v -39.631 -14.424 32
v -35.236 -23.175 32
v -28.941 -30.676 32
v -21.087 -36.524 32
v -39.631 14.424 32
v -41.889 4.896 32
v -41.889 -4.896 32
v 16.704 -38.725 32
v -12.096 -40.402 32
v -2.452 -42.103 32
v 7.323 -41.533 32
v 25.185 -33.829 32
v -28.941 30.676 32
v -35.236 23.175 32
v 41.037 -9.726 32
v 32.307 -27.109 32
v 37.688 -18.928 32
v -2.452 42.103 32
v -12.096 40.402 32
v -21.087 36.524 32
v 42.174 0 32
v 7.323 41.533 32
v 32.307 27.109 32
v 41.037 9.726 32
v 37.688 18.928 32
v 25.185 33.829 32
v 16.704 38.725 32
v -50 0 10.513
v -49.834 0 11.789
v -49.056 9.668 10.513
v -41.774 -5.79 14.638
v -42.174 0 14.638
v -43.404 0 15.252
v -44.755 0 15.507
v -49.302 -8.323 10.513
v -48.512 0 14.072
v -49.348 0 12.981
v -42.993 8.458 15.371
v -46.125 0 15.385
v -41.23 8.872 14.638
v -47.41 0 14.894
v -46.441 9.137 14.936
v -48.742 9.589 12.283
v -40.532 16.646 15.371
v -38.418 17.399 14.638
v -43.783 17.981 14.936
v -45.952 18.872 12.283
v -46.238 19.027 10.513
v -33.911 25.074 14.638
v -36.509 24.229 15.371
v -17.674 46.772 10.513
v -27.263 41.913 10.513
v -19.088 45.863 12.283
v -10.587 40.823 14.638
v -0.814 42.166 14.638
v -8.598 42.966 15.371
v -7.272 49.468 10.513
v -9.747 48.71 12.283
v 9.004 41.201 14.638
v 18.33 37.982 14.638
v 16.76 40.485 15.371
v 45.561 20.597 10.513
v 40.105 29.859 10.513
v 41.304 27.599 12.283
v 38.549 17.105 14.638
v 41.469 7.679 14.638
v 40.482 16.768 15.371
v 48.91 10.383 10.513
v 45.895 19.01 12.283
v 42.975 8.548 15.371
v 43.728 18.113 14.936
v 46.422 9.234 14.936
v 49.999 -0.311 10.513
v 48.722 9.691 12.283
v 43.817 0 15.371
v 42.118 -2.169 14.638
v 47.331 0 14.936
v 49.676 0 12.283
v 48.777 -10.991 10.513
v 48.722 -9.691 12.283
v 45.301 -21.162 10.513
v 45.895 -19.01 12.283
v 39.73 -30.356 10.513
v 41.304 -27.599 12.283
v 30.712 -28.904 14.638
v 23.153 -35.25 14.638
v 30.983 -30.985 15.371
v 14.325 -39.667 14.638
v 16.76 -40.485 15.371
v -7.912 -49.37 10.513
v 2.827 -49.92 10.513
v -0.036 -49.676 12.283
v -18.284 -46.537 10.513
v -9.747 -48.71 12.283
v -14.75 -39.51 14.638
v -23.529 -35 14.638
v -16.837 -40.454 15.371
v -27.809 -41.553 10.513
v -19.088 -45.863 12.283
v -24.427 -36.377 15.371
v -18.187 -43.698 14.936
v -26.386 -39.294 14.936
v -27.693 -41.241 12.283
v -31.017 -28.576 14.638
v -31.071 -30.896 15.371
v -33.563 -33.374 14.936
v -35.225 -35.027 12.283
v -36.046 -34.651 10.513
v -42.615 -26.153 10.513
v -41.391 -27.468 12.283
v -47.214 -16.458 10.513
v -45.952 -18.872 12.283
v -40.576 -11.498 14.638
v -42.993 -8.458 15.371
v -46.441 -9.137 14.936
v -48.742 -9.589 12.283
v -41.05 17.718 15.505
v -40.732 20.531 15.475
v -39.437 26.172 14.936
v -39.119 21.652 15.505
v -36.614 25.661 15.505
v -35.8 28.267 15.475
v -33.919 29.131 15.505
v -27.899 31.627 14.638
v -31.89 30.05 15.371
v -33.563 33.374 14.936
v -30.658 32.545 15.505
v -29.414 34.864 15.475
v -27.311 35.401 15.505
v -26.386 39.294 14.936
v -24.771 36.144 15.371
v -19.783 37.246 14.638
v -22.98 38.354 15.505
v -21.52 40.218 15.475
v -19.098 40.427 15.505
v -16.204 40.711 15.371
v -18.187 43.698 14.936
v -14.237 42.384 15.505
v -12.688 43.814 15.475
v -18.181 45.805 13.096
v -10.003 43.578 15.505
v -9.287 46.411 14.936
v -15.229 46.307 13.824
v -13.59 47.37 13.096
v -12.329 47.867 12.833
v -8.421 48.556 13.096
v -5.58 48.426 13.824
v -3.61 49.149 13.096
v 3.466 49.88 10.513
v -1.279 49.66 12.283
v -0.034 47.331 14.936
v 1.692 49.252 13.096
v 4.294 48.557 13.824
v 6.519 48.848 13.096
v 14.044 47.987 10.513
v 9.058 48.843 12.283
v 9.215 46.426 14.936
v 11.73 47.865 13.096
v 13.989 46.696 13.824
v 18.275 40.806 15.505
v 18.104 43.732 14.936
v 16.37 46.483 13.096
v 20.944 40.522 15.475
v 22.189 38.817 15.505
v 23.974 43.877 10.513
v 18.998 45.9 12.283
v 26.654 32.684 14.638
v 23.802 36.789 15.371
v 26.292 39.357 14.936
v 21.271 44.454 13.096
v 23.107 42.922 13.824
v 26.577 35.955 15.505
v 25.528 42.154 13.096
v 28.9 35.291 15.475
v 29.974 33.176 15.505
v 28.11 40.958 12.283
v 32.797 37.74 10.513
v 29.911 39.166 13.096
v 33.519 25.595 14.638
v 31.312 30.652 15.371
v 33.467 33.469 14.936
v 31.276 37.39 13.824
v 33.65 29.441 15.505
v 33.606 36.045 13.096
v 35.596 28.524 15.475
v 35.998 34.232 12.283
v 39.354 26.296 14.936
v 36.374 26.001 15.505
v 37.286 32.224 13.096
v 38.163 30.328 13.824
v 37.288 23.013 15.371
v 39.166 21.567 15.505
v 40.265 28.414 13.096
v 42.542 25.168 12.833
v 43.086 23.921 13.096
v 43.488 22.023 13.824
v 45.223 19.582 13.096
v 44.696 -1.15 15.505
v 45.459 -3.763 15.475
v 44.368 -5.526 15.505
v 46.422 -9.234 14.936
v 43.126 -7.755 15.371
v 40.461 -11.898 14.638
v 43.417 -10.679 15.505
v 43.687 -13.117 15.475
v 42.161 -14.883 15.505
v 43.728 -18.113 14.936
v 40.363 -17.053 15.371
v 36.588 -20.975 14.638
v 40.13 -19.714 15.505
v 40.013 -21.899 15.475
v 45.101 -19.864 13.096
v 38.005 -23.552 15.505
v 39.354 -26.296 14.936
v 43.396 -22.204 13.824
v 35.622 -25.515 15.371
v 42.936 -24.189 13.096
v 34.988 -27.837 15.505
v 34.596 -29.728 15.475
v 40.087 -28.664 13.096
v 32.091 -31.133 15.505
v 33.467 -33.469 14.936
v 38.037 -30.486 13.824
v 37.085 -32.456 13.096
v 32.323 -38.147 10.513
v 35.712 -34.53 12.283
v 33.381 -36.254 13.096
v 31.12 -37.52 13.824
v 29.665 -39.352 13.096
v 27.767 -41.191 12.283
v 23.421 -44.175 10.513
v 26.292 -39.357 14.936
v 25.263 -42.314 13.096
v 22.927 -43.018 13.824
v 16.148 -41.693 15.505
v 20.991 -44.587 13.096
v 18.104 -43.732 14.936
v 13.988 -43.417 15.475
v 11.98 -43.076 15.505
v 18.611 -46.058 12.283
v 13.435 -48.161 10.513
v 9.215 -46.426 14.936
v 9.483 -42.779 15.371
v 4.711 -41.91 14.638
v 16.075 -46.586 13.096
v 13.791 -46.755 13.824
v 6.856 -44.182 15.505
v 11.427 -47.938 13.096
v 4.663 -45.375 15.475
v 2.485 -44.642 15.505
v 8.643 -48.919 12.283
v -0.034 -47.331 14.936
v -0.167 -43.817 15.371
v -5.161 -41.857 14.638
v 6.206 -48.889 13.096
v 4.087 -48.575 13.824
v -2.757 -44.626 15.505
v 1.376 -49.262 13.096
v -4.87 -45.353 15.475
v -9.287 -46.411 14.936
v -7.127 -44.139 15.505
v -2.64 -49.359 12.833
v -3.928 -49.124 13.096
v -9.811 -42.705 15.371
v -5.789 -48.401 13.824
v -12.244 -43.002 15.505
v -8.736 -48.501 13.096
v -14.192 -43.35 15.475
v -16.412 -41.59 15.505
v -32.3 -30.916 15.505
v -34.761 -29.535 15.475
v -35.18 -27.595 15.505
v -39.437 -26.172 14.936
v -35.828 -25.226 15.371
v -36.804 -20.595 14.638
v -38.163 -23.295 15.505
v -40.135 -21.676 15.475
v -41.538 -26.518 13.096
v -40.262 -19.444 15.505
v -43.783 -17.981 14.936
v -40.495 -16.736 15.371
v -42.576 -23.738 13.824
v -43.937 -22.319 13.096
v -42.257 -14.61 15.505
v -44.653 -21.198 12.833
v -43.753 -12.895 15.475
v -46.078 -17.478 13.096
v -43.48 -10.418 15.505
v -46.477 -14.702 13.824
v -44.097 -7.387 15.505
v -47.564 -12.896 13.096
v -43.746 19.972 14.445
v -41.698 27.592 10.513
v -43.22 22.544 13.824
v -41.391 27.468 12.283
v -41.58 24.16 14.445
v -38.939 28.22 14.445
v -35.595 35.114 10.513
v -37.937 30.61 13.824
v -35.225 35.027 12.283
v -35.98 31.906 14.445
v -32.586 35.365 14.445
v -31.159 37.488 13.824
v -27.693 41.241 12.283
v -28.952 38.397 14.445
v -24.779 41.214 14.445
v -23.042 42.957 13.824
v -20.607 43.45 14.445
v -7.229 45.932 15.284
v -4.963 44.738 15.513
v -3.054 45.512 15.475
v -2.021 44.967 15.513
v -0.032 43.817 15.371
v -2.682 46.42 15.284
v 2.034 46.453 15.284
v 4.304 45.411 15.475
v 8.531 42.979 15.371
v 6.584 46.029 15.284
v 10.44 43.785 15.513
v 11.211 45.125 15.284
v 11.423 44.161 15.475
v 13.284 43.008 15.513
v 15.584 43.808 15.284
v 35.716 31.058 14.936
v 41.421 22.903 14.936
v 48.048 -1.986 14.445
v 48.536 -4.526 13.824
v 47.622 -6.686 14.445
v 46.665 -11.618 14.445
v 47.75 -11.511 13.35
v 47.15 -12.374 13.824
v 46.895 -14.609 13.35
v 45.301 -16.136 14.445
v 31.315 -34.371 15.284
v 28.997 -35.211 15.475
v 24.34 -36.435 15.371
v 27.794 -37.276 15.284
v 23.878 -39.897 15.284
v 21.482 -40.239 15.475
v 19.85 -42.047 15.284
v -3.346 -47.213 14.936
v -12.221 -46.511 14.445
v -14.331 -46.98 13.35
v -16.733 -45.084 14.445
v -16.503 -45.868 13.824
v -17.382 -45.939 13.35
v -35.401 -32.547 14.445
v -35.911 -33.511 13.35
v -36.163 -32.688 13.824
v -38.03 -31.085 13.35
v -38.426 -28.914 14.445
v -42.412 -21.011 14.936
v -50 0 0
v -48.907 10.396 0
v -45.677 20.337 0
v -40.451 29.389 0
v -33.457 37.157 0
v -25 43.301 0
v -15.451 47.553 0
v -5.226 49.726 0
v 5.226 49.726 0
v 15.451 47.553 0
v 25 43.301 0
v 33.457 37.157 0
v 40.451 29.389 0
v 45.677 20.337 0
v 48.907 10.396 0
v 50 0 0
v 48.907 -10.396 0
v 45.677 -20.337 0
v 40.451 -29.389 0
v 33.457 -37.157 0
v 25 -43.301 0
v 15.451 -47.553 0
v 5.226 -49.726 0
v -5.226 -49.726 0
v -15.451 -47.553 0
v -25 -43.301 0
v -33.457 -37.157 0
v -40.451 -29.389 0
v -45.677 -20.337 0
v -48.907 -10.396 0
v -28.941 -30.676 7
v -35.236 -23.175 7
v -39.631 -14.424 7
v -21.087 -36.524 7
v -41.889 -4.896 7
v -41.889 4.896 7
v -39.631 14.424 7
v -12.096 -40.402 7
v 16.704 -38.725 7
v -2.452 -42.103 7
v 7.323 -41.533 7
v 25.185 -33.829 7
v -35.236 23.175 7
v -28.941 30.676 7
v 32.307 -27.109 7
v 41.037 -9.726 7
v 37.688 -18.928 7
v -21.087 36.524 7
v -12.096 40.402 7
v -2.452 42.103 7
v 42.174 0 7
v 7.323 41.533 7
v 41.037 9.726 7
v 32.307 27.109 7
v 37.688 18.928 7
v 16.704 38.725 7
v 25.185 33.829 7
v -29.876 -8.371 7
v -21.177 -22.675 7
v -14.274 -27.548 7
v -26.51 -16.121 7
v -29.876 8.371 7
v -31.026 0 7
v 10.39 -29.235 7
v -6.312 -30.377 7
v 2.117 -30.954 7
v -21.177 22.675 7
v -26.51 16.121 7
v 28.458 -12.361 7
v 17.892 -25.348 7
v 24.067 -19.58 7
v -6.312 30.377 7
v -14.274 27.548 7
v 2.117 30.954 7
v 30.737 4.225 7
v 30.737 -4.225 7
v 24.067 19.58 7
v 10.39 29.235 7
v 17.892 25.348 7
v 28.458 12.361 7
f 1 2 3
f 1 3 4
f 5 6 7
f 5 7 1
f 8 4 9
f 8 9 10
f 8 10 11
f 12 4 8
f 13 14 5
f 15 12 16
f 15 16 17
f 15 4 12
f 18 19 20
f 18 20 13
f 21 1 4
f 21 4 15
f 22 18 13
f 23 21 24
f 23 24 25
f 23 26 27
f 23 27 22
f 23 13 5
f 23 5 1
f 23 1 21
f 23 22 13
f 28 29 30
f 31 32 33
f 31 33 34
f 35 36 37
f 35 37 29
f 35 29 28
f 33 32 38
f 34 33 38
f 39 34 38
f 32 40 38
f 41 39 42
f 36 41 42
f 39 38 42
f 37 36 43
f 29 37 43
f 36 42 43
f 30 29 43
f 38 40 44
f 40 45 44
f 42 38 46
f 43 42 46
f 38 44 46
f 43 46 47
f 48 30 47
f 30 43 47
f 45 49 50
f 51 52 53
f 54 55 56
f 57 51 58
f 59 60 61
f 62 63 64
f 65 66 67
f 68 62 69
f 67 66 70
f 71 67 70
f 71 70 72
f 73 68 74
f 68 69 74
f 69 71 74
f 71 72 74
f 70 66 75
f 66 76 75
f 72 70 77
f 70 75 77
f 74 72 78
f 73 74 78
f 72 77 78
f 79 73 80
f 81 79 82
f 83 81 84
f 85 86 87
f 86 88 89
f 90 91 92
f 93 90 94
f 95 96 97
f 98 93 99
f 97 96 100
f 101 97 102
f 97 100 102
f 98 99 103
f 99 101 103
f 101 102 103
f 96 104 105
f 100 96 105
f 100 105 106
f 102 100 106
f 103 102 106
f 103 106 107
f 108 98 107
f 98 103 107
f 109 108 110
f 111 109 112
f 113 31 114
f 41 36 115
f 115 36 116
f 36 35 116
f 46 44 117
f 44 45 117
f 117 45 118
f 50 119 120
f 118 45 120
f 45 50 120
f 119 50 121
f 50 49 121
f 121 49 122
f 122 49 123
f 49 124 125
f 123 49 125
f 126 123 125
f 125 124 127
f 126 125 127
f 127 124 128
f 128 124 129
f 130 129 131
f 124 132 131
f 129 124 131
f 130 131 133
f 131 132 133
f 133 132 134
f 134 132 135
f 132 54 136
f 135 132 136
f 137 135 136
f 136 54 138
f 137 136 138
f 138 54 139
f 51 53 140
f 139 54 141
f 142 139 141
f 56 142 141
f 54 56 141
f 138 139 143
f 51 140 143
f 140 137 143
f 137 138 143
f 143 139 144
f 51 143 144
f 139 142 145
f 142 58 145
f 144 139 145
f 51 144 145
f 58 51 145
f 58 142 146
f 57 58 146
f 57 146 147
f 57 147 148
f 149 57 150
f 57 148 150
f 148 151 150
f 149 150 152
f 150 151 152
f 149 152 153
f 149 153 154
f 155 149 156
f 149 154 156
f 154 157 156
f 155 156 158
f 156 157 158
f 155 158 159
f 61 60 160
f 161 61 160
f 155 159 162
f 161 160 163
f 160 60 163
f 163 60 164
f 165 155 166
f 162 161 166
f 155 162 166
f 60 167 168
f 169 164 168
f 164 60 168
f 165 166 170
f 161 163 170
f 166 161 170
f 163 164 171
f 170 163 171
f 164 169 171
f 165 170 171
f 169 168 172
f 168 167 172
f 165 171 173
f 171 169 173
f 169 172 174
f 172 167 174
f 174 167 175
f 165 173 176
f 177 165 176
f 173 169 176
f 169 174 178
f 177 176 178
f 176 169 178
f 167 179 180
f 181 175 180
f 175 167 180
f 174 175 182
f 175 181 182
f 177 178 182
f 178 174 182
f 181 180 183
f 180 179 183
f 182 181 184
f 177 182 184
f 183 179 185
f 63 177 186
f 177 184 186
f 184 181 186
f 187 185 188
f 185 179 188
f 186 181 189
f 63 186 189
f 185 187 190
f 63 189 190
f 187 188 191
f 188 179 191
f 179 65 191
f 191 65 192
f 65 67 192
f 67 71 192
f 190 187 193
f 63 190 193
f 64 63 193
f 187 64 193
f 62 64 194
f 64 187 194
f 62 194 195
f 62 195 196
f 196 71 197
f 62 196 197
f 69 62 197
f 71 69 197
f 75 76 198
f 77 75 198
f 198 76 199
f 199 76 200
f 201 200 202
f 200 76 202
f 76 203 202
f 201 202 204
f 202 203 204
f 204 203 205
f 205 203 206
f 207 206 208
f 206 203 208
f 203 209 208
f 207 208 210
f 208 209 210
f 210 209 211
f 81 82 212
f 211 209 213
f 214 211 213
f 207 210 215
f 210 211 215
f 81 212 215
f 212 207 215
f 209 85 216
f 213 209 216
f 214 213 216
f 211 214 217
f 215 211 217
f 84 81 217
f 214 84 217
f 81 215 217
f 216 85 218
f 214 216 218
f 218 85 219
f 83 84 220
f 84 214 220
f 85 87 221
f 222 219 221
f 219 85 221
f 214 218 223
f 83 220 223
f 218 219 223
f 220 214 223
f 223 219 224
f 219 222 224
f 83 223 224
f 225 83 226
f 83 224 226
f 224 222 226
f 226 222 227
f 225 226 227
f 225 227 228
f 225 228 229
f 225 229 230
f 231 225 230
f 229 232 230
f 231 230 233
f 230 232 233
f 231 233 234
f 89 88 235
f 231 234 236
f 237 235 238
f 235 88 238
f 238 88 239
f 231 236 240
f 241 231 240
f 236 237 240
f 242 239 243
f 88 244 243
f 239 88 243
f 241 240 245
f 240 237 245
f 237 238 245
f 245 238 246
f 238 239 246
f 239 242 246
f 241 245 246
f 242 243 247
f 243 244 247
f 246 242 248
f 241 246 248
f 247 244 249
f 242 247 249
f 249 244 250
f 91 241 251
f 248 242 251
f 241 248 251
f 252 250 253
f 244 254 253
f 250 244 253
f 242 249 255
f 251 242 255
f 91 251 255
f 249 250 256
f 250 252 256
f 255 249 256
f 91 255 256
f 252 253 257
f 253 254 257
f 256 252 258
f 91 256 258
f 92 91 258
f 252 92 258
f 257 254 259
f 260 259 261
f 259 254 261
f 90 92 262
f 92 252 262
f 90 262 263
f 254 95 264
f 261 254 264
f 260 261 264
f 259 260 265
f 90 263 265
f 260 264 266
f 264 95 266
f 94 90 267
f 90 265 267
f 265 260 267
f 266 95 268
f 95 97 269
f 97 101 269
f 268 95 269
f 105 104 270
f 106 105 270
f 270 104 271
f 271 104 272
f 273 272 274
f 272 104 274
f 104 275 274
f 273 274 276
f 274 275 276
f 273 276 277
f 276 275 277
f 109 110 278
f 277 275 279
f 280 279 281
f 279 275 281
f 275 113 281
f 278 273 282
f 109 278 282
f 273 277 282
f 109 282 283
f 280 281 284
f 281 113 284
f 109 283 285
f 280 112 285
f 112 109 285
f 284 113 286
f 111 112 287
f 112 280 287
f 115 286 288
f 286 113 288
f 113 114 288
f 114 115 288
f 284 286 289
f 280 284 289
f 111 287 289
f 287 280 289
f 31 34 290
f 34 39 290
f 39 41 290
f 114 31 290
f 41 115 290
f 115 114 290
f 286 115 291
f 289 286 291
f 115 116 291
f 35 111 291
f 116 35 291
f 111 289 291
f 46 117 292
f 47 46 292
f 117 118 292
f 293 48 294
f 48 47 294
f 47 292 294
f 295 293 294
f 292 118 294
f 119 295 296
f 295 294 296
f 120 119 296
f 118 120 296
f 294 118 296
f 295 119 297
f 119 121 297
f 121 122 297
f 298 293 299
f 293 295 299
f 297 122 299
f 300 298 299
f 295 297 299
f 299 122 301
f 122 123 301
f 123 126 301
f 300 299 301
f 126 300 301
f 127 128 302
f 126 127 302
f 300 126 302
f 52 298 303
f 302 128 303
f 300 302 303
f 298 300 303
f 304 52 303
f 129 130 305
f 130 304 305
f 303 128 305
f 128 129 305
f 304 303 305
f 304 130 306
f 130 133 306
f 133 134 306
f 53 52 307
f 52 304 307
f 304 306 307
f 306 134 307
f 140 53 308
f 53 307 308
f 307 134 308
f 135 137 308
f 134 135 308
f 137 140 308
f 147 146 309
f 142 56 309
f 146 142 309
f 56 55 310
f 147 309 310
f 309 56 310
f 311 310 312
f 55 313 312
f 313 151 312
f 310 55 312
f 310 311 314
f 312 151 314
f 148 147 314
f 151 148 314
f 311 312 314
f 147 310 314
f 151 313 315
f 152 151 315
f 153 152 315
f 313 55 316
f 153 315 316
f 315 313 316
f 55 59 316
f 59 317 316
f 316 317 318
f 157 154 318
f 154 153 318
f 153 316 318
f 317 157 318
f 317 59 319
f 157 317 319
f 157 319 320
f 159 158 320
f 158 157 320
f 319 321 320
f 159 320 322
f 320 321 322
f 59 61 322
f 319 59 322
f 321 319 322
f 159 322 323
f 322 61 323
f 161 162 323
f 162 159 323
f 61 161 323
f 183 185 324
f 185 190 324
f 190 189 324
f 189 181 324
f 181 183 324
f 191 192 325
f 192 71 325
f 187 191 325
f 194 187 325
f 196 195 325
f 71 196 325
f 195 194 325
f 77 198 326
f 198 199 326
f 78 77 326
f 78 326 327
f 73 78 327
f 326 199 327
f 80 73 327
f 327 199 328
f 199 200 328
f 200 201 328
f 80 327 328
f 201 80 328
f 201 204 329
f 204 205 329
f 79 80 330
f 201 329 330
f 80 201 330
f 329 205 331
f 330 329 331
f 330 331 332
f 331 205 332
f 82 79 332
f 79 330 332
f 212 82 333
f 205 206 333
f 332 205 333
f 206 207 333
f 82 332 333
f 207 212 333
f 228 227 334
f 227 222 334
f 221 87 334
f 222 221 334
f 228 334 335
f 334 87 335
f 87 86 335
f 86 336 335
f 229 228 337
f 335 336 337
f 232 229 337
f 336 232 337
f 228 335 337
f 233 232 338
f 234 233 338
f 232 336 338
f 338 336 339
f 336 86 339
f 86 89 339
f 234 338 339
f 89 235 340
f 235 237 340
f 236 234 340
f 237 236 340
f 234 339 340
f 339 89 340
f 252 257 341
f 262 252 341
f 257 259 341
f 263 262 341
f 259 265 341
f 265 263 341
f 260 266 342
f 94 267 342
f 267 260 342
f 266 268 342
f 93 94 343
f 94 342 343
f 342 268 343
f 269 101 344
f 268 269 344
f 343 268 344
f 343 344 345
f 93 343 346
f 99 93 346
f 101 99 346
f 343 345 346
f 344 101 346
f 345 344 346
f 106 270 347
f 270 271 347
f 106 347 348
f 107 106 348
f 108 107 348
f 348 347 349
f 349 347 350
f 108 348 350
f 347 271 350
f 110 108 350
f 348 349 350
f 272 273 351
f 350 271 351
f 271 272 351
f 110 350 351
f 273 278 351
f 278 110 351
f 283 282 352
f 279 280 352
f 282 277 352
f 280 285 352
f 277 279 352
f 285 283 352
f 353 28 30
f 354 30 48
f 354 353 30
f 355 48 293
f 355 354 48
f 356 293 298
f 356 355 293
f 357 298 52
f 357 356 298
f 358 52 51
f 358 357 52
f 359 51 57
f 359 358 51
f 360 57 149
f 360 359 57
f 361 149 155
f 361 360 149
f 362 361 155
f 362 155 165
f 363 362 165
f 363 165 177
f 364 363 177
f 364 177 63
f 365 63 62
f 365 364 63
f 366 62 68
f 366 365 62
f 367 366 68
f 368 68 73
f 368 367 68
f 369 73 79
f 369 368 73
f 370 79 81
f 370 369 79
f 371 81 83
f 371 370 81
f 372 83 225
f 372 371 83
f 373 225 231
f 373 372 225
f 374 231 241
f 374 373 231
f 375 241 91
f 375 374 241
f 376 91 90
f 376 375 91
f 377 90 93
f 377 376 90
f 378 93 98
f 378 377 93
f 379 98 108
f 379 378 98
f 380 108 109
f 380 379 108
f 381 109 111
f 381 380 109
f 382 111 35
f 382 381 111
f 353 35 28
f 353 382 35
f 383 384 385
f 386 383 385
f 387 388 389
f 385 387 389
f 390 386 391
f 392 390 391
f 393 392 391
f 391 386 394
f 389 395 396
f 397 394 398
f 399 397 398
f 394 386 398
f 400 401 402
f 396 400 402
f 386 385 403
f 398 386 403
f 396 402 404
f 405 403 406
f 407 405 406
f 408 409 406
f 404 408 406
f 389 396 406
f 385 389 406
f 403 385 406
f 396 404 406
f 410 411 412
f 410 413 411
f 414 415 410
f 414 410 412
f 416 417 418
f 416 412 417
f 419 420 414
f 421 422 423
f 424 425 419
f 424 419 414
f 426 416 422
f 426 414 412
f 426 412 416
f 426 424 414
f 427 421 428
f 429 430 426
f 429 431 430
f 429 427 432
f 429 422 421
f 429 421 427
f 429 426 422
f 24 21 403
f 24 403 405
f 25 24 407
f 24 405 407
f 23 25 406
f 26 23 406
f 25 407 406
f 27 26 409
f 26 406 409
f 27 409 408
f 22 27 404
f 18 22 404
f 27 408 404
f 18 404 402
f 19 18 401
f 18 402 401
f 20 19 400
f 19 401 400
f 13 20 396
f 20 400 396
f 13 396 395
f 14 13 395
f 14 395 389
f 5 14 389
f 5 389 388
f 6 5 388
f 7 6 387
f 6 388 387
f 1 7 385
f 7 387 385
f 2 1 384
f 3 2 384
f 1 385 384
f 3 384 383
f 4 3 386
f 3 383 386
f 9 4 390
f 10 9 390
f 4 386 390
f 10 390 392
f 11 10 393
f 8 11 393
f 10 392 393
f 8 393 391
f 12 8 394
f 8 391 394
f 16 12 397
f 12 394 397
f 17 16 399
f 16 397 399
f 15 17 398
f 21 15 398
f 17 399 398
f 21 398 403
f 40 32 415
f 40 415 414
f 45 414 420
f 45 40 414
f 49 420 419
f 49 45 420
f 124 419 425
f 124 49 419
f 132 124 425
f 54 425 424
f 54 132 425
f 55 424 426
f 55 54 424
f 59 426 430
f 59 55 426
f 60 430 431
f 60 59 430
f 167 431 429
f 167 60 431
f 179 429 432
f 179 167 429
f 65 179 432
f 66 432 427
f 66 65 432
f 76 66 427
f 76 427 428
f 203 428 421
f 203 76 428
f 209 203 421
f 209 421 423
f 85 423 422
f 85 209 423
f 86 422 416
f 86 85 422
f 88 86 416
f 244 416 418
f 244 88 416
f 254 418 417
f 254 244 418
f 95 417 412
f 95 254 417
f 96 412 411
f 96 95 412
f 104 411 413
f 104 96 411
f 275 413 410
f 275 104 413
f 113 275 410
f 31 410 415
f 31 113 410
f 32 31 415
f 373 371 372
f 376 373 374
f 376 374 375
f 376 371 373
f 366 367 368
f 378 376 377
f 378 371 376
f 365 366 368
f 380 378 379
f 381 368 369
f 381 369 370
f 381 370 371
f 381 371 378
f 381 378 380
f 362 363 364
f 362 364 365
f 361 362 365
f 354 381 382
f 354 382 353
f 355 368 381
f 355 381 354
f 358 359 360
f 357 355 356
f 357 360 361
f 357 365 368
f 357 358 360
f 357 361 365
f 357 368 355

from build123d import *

# Parameters (mm, degrees)
F2_R     = 5
F3_R     = 42.1739130435
F3_R_2   = 31.026334039
F4_DEPTH = 25


with BuildPart() as f1:
    # F0 (on Front) → F1 (revolve)
    with BuildSketch(Plane.XZ):
        Polygon((-50, 0), (0, 0), (0, 7), (-31.026334039, 7), (-50, 20), align=None)
    revolve(axis=Axis((0, 0, 3.5), (0, 0, -1)))

    # F2
    f2_edges = [f1.edges().sort_by_distance(p)[0] for p in [
        (50, 0, 20),
    ]]
    fillet(f2_edges, radius=F2_R)


with BuildPart() as f4:
    # F3 (on face) → F4 (new body)
    with BuildSketch(Plane.XY.offset(7)):
        Circle(F3_R)
        Circle(F3_R_2, mode=Mode.SUBTRACT)
        Circle(F3_R_2)
    extrude(amount=F4_DEPTH)


solid = Compound([f1.part, f4.part])
